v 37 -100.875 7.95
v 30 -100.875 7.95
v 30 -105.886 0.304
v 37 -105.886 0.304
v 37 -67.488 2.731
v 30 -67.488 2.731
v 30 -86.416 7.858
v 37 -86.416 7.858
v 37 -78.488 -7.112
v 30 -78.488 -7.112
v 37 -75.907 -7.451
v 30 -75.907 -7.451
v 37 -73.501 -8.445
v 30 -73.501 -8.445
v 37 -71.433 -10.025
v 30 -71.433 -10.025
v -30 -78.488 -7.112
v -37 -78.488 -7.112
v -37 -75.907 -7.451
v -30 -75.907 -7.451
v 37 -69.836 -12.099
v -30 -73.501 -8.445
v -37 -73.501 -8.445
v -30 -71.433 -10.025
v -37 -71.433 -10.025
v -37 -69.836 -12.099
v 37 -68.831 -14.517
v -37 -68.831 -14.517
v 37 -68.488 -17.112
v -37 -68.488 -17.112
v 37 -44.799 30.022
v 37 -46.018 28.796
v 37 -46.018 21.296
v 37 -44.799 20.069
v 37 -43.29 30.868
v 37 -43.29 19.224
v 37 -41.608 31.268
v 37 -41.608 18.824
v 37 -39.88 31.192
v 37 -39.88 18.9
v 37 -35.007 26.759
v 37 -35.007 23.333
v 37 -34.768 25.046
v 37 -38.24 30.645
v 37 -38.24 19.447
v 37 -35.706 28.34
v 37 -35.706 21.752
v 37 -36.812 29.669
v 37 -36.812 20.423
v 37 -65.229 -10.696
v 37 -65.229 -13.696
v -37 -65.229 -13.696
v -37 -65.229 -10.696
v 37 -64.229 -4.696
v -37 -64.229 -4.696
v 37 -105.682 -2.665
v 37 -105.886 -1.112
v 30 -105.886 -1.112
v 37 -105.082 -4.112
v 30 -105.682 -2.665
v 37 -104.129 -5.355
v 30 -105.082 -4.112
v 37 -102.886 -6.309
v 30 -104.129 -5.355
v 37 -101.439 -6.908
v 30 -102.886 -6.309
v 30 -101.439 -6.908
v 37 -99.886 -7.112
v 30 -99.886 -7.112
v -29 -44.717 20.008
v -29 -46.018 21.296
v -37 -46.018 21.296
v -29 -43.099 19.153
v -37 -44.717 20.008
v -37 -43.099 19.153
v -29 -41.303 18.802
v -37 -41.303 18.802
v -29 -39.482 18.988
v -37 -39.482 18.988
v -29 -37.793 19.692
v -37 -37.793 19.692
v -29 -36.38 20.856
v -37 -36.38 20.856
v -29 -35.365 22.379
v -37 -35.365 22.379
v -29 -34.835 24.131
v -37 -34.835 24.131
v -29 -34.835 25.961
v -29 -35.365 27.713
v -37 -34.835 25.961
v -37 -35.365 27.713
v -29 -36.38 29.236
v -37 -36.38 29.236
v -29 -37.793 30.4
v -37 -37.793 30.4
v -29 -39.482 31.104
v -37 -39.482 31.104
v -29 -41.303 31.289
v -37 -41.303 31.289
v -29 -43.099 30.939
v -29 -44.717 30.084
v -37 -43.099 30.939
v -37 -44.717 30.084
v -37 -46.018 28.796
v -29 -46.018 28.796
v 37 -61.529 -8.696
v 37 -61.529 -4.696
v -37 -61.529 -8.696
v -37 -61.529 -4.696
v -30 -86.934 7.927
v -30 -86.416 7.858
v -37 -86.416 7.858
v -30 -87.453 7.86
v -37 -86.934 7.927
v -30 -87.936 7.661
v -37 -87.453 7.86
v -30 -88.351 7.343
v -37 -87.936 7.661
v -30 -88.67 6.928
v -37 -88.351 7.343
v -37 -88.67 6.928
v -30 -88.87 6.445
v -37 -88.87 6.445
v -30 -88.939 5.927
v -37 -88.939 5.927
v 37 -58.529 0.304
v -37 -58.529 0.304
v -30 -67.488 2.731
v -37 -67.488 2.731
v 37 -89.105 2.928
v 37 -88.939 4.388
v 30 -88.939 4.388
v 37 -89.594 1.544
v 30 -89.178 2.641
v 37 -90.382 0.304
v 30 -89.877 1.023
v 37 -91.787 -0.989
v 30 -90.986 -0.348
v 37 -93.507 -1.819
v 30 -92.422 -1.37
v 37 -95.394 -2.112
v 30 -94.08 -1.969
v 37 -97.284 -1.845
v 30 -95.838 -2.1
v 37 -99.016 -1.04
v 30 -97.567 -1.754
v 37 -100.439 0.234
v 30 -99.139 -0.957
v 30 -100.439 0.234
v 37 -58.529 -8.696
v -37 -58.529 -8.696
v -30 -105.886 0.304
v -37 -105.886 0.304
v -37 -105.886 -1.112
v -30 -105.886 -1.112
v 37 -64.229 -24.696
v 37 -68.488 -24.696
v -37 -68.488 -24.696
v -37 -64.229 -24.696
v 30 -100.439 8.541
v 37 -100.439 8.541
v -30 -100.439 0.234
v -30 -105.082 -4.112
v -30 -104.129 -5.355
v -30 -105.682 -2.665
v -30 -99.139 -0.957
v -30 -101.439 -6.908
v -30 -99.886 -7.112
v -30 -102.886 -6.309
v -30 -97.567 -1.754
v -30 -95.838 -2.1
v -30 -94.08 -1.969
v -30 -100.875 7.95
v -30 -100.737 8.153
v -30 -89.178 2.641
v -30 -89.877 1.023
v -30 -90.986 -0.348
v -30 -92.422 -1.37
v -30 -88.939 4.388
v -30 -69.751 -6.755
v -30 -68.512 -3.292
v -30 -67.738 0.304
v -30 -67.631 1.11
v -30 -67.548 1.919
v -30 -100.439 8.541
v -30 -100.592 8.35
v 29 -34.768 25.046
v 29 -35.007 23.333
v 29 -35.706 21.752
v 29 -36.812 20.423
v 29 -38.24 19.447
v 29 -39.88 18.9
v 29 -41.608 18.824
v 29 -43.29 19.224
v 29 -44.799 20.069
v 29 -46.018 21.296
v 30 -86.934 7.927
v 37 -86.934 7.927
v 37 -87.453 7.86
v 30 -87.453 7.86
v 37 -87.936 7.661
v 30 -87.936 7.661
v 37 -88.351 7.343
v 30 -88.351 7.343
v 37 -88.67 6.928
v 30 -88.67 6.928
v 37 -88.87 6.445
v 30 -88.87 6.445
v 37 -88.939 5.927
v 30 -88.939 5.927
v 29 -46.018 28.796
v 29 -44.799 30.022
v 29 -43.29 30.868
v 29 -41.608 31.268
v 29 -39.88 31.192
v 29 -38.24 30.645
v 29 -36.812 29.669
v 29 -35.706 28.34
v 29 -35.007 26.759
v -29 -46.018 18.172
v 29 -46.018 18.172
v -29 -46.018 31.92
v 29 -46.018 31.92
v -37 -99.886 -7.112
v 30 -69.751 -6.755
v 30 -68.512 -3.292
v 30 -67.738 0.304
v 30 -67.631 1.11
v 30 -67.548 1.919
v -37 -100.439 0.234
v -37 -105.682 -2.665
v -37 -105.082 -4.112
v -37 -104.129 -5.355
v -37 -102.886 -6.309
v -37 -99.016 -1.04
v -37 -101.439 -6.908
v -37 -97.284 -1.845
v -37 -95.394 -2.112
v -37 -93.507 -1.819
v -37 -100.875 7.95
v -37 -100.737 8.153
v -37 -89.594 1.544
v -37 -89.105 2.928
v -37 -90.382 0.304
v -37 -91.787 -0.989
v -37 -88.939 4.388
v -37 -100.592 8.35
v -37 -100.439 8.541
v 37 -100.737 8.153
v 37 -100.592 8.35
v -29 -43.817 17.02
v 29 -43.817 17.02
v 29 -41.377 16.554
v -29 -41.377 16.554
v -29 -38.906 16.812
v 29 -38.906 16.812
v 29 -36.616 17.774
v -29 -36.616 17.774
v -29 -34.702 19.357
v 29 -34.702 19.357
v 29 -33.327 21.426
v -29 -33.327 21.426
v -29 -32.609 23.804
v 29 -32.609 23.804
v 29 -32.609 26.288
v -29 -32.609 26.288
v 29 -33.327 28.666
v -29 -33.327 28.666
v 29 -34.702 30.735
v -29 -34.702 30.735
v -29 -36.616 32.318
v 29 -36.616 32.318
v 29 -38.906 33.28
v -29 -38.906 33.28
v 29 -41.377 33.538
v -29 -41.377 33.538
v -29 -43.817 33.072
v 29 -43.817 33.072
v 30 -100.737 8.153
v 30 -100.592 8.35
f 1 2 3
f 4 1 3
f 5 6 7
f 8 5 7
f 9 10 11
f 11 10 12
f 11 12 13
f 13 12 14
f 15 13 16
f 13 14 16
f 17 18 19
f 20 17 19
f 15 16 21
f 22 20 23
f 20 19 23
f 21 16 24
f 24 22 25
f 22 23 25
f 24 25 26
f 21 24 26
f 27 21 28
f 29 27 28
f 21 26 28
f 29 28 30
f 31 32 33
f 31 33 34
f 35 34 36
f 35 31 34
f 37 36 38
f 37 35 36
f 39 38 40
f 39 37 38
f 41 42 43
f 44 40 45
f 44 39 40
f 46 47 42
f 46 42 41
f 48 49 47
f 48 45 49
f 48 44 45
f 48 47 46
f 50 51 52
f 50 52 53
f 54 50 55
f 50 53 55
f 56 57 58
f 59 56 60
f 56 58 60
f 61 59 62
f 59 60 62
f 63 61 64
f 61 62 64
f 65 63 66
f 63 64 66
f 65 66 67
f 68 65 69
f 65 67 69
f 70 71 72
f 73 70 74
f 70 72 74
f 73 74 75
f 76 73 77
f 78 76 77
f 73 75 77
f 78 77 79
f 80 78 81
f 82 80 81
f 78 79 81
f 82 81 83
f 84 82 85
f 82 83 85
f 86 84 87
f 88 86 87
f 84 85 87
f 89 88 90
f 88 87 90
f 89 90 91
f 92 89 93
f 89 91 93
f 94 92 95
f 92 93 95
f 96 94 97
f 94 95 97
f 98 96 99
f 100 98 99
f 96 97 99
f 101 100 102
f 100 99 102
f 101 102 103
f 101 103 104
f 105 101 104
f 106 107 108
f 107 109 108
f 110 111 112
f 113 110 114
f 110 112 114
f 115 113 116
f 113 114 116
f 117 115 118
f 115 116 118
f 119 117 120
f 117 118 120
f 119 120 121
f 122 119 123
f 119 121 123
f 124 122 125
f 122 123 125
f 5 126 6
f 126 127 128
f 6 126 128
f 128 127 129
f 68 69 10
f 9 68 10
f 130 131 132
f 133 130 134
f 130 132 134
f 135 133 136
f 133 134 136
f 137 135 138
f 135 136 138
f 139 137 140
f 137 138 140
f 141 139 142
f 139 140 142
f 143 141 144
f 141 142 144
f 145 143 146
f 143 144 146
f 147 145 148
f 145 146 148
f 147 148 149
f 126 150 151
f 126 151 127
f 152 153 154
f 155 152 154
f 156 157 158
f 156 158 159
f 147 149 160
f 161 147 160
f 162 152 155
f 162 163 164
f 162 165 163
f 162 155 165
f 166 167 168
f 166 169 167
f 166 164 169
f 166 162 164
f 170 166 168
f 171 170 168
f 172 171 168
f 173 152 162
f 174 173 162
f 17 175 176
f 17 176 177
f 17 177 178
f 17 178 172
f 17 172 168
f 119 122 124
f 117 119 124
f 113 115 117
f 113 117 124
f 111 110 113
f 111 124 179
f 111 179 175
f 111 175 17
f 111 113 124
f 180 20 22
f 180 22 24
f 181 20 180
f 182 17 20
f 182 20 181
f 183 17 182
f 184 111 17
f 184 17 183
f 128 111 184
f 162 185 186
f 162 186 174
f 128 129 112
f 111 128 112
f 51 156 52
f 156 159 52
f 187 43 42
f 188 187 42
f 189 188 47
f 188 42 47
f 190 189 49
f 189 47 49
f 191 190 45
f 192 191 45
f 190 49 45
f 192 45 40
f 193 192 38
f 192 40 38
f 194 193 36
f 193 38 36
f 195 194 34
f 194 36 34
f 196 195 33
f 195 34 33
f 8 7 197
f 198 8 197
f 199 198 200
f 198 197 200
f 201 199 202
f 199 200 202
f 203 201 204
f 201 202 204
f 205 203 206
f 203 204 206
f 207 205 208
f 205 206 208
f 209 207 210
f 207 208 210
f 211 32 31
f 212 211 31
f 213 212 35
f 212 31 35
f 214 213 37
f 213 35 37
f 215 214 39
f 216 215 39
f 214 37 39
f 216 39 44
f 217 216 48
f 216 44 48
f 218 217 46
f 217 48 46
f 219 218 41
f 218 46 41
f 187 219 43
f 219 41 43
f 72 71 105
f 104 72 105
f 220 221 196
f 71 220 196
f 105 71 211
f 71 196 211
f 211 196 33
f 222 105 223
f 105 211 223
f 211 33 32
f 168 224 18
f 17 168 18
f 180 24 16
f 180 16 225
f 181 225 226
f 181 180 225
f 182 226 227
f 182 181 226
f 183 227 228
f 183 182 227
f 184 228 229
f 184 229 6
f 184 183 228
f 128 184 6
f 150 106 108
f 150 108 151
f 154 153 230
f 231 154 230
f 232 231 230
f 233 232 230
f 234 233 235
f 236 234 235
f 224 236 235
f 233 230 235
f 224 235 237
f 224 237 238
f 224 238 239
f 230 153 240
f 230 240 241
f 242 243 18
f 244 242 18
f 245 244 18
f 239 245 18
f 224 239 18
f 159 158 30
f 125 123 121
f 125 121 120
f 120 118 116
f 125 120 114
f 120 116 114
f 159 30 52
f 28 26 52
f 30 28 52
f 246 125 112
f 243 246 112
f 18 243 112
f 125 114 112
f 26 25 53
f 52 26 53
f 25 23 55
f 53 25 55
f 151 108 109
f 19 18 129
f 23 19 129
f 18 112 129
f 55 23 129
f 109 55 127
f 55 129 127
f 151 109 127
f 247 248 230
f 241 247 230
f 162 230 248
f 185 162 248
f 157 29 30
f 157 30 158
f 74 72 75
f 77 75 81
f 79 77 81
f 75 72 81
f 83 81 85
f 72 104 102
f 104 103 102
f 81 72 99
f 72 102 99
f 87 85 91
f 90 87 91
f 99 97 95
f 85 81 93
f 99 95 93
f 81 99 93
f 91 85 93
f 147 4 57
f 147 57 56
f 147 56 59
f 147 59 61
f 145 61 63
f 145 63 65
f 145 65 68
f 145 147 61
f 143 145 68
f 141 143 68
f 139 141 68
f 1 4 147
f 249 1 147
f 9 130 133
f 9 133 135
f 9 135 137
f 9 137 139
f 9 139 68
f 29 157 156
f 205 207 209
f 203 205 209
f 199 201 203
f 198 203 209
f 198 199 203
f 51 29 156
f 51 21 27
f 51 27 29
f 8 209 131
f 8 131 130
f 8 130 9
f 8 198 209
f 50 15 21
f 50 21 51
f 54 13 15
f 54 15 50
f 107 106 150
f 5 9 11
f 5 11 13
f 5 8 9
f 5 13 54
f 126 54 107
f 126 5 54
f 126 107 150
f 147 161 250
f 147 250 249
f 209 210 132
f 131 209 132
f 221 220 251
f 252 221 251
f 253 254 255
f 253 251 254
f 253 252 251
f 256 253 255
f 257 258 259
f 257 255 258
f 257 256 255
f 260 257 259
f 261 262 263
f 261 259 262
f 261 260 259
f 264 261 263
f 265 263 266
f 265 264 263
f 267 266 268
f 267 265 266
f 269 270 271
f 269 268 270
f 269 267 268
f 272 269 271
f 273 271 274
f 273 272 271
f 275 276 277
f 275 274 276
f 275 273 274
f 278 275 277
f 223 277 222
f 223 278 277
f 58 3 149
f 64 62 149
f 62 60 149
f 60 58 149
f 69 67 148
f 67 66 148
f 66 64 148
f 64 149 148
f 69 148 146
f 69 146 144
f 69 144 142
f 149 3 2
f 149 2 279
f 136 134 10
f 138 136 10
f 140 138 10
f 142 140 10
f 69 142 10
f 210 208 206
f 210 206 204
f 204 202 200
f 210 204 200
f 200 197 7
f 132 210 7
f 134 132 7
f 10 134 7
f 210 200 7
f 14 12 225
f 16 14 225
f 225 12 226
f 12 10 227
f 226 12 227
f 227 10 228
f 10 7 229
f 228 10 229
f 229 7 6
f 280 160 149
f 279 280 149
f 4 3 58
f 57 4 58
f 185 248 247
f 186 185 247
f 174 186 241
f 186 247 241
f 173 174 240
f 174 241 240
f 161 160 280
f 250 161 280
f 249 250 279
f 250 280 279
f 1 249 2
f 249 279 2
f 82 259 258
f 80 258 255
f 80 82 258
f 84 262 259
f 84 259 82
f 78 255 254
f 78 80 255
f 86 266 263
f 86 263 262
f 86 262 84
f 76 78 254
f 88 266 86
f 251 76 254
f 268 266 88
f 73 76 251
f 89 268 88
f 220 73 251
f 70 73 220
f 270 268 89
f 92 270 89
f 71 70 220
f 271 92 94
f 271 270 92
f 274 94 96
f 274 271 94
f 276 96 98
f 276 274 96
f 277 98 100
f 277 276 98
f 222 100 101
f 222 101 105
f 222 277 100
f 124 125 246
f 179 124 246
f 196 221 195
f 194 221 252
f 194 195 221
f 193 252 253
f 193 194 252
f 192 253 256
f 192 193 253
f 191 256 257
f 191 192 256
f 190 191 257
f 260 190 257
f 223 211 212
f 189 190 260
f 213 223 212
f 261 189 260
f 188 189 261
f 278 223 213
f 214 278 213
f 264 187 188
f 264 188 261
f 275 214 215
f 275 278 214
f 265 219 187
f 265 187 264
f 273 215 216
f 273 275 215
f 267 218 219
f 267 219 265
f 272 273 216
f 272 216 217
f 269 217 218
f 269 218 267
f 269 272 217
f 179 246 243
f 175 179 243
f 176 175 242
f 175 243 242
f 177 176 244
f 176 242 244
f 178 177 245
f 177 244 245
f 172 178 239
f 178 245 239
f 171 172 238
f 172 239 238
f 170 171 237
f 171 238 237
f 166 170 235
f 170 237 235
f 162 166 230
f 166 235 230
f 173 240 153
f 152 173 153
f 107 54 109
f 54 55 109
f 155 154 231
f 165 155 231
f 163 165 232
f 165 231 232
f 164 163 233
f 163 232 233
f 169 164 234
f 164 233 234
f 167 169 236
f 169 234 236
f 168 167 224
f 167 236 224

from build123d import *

# Parameters (mm, degrees)
F1_DEPTH      = 37
F1_DEPTH_BACK = 37
F2_DEPTH      = 30
F2_DEPTH_BACK = 30
F3_R          = 8.5
F4_DEPTH      = 37
F4_DEPTH_BACK = 37
F6_DEPTH      = 74.001
F8_DEPTH      = 8
F10_DEPTH     = 8


with BuildPart() as f1:
    # F0 (on Right) → F1 (new body, two sides)
    with BuildSketch(Plane.YZ) as f1_sk:
        with BuildLine():
            ThreePointArc((-78.4882180956, -7.1124182744), (-74.6718335634, -7.8693014244), (-71.4331604605, -10.0253764539))
            ThreePointArc((-71.4331604605, -10.0253764539), (-69.0747981117, -5.0434256298), (-67.7380949338, 0.3039972631))
            Line((-67.7380949338, 0.3039972631), (-67.8932940144, 0.3039972631))
            Line((-67.8932940144, 0.3039972631), (-88.9387147452, 0.3039972631))
            Line((-88.9387147452, 0.3039972631), (-90.38160708, 0.3039972631))
            ThreePointArc((-90.38160708, 0.3039972631), (-95.393650332, -2.112262057), (-100.4387147452, 0.2342697942))
            ThreePointArc((-100.4387147452, 0.2342697942), (-100.4673894342, 0.2690345458), (-100.4958224104, 0.3039972631))
            Line((-100.4958224104, 0.3039972631), (-105.886151975, 0.3039972631))
            Line((-105.886151975, 0.3039972631), (-105.886151975, -1.1124182744))
            ThreePointArc((-105.886151975, -1.1124182744), (-104.1287926621, -5.3550589615), (-99.886151975, -7.1124182744))
            Line((-99.886151975, -7.1124182744), (-78.4882180956, -7.1124182744))
        make_face()
        with BuildLine():
            Line((-100.4387147452, 0.2342697942), (-100.4387147452, 0.3039972631))
            Line((-100.4387147452, 0.3039972631), (-100.4958224104, 0.3039972631))
            ThreePointArc((-100.4958224104, 0.3039972631), (-100.4673894342, 0.2690345458), (-100.4387147452, 0.2342697942))
        make_face()
        with BuildLine():
            Line((-100.4958224104, 0.3039972631), (-100.4387147452, 0.3039972631))
            Line((-100.4387147452, 0.3039972631), (-100.4387147452, 8.5408936571))
            ThreePointArc((-100.4387147452, 8.5408936571), (-100.6653734684, 8.2517813311), (-100.8753365595, 7.9503255065))
            ThreePointArc((-100.8753365595, 7.9503255065), (-101.9307231786, 4.0653605264), (-100.4958224104, 0.3039972631))
        make_face()
        with BuildLine():
            Line((-100.8753365595, 7.9503255065), (-105.886151975, 0.3039972631))
            Line((-105.886151975, 0.3039972631), (-100.4958224104, 0.3039972631))
            ThreePointArc((-100.4958224104, 0.3039972631), (-101.9307231786, 4.0653605264), (-100.8753365595, 7.9503255065))
        make_face()
        with BuildLine():
            Line((-67.8932940144, 0.3039972631), (-67.7380949338, 0.3039972631))
            ThreePointArc((-67.7380949338, 0.3039972631), (-67.5865005705, 1.5145753621), (-67.4877856318, 2.7306080696))
            Line((-67.4877856318, 2.7306080696), (-86.4158285453, 7.8575344772))
            ThreePointArc((-86.4158285453, 7.8575344772), (-88.1540804515, 7.5154562914), (-88.9387147452, 5.9270966974))
            Line((-88.9387147452, 5.9270966974), (-88.9387147452, 4.3875817256))
            Line((-88.9387147452, 4.3875817256), (-88.9387147452, 0.3039972631))
            Line((-88.9387147452, 0.3039972631), (-67.8932940144, 0.3039972631))
        make_face()
        with BuildLine():
            Line((-68.4882180956, -24.6960027369), (-64.2290080275, -24.6960027369))
            Line((-64.2290080275, -24.6960027369), (-65.2290080275, -13.6960027369))
            Line((-65.2290080275, -13.6960027369), (-65.2290080275, -10.6960027369))
            Line((-65.2290080275, -10.6960027369), (-64.2290080275, -4.6960027369))
            Line((-64.2290080275, -4.6960027369), (-61.5290080275, -4.6960027369))
            Line((-61.5290080275, -4.6960027369), (-61.5290080275, -8.6960027369))
            Line((-61.5290080275, -8.6960027369), (-58.5290080275, -8.6960027369))
            Line((-58.5290080275, -8.6960027369), (-58.5290080275, 0.3039972631))
            Line((-58.5290080275, 0.3039972631), (-67.7380949338, 0.3039972631))
            ThreePointArc((-67.7380949338, 0.3039972631), (-69.0747981117, -5.0434256298), (-71.4331604605, -10.0253764539))
            ThreePointArc((-71.4331604605, -10.0253764539), (-69.2537561094, -13.2751390528), (-68.4882180956, -17.1124182744))
            Line((-68.4882180956, -17.1124182744), (-68.4882180956, -24.6960027369))
        make_face()
        with BuildLine():
            ThreePointArc((-67.4877856318, 2.7306080696), (-67.5865005705, 1.5145753621), (-67.7380949338, 0.3039972631))
            Line((-67.7380949338, 0.3039972631), (-58.5290080275, 0.3039972631))
            Line((-58.5290080275, 0.3039972631), (-67.4877856318, 2.7306080696))
        make_face()
        with BuildLine():
            Line((-90.38160708, 0.3039972631), (-88.9387147452, 0.3039972631))
            Line((-88.9387147452, 0.3039972631), (-88.9387147452, 4.3875817256))
            ThreePointArc((-88.9387147452, 4.3875817256), (-89.3100444235, 2.2220794541), (-90.38160708, 0.3039972631))
        make_face()
    extrude(amount=-F1_DEPTH)
    extrude(f1_sk.sketch, amount=F1_DEPTH_BACK)

    # F0 (on Right) → F2 (cut, two sides)
    with BuildSketch(Plane.YZ) as f2_sk:
        with BuildLine():
            ThreePointArc((-67.4387147452, 4.3875817256), (-122.4216308216, 11.8656991367), (-71.4331604605, -10.0253764539))
            ThreePointArc((-71.4331604605, -10.0253764539), (-74.6718335634, -7.8693014244), (-78.4882180956, -7.1124182744))
            Line((-78.4882180956, -7.1124182744), (-99.886151975, -7.1124182744))
            ThreePointArc((-99.886151975, -7.1124182744), (-104.1287926621, -5.3550589615), (-105.886151975, -1.1124182744))
            Line((-105.886151975, -1.1124182744), (-105.886151975, 0.3039972631))
            Line((-105.886151975, 0.3039972631), (-100.8753365595, 7.9503255065))
            ThreePointArc((-100.8753365595, 7.9503255065), (-100.6653734684, 8.2517813311), (-100.4387147452, 8.5408936571))
            ThreePointArc((-100.4387147452, 8.5408936571), (-93.2307745286, 10.5010913559), (-88.9387147452, 4.3875817256))
            Line((-88.9387147452, 4.3875817256), (-88.9387147452, 5.9270966974))
            ThreePointArc((-88.9387147452, 5.9270966974), (-88.1540804515, 7.5154562914), (-86.4158285453, 7.8575344772))
            Line((-86.4158285453, 7.8575344772), (-67.4877856318, 2.7306080696))
            ThreePointArc((-67.4877856318, 2.7306080696), (-67.4509851555, 3.5587316715), (-67.4387147452, 4.3875817256))
        make_face()
        with BuildLine():
            Line((-100.4387147452, 0.3039972631), (-90.38160708, 0.3039972631))
            ThreePointArc((-90.38160708, 0.3039972631), (-89.3100444235, 2.2220794541), (-88.9387147452, 4.3875817256))
            ThreePointArc((-88.9387147452, 4.3875817256), (-93.2307745286, 10.5010913559), (-100.4387147452, 8.5408936571))
            Line((-100.4387147452, 8.5408936571), (-100.4387147452, 0.3039972631))
        make_face()
        with BuildLine():
            ThreePointArc((-100.4387147452, 0.2342697942), (-95.393650332, -2.112262057), (-90.38160708, 0.3039972631))
            Line((-90.38160708, 0.3039972631), (-100.4387147452, 0.3039972631))
            Line((-100.4387147452, 0.3039972631), (-100.4387147452, 0.2342697942))
        make_face()
        with BuildLine():
            Line((-100.4958224104, 0.3039972631), (-100.4387147452, 0.3039972631))
            Line((-100.4387147452, 0.3039972631), (-100.4387147452, 8.5408936571))
            ThreePointArc((-100.4387147452, 8.5408936571), (-100.6653734684, 8.2517813311), (-100.8753365595, 7.9503255065))
            ThreePointArc((-100.8753365595, 7.9503255065), (-101.9307231786, 4.0653605264), (-100.4958224104, 0.3039972631))
        make_face()
        with BuildLine():
            Line((-100.4387147452, 0.2342697942), (-100.4387147452, 0.3039972631))
            Line((-100.4387147452, 0.3039972631), (-100.4958224104, 0.3039972631))
            ThreePointArc((-100.4958224104, 0.3039972631), (-100.4673894342, 0.2690345458), (-100.4387147452, 0.2342697942))
        make_face()
        with BuildLine():
            ThreePointArc((-78.4882180956, -7.1124182744), (-74.6718335634, -7.8693014244), (-71.4331604605, -10.0253764539))
            ThreePointArc((-71.4331604605, -10.0253764539), (-69.0747981117, -5.0434256298), (-67.7380949338, 0.3039972631))
            Line((-67.7380949338, 0.3039972631), (-67.8932940144, 0.3039972631))
            Line((-67.8932940144, 0.3039972631), (-88.9387147452, 0.3039972631))
            Line((-88.9387147452, 0.3039972631), (-90.38160708, 0.3039972631))
            ThreePointArc((-90.38160708, 0.3039972631), (-95.393650332, -2.112262057), (-100.4387147452, 0.2342697942))
            ThreePointArc((-100.4387147452, 0.2342697942), (-100.4673894342, 0.2690345458), (-100.4958224104, 0.3039972631))
            Line((-100.4958224104, 0.3039972631), (-105.886151975, 0.3039972631))
            Line((-105.886151975, 0.3039972631), (-105.886151975, -1.1124182744))
            ThreePointArc((-105.886151975, -1.1124182744), (-104.1287926621, -5.3550589615), (-99.886151975, -7.1124182744))
            Line((-99.886151975, -7.1124182744), (-78.4882180956, -7.1124182744))
        make_face()
        with BuildLine():
            Line((-67.8932940144, 0.3039972631), (-67.7380949338, 0.3039972631))
            ThreePointArc((-67.7380949338, 0.3039972631), (-67.5865005705, 1.5145753621), (-67.4877856318, 2.7306080696))
            Line((-67.4877856318, 2.7306080696), (-86.4158285453, 7.8575344772))
            ThreePointArc((-86.4158285453, 7.8575344772), (-88.1540804515, 7.5154562914), (-88.9387147452, 5.9270966974))
            Line((-88.9387147452, 5.9270966974), (-88.9387147452, 4.3875817256))
            Line((-88.9387147452, 4.3875817256), (-88.9387147452, 0.3039972631))
            Line((-88.9387147452, 0.3039972631), (-67.8932940144, 0.3039972631))
        make_face()
        with BuildLine():
            Line((-100.8753365595, 7.9503255065), (-105.886151975, 0.3039972631))
            Line((-105.886151975, 0.3039972631), (-100.4958224104, 0.3039972631))
            ThreePointArc((-100.4958224104, 0.3039972631), (-101.9307231786, 4.0653605264), (-100.8753365595, 7.9503255065))
        make_face()
        with BuildLine():
            Line((-90.38160708, 0.3039972631), (-88.9387147452, 0.3039972631))
            Line((-88.9387147452, 0.3039972631), (-88.9387147452, 4.3875817256))
            ThreePointArc((-88.9387147452, 4.3875817256), (-89.3100444235, 2.2220794541), (-90.38160708, 0.3039972631))
        make_face()
    extrude(amount=-F2_DEPTH, mode=Mode.SUBTRACT)
    extrude(f2_sk.sketch, amount=F2_DEPTH_BACK, mode=Mode.SUBTRACT)


with BuildPart() as f4:
    # F3 (on Right) → F4 (new body, two sides)
    with BuildSketch(Plane.YZ) as f4_sk:
        with Locations((-41.0175137222, 25.0459443778)):
            Circle(F3_R)
    extrude(amount=F4_DEPTH)
    extrude(f4_sk.sketch, amount=-F4_DEPTH_BACK)

    # F5 (on face) → F6 (cut, through all)
    with BuildSketch(Plane.YZ.offset(37)):
        with BuildLine():
            Line((-46.0175137222, 18.1720808353), (-46.0175137222, 31.9198079202))
            ThreePointArc((-46.0175137222, 31.9198079202), (-49.5175137222, 25.0459443778), (-46.0175137222, 18.1720808353))
        make_face()
    extrude(amount=-F6_DEPTH, mode=Mode.SUBTRACT)

    # F7 (on face) → F8 (cut)
    with BuildSketch(Plane.YZ.offset(37)):
        with BuildLine():
            ThreePointArc((-46.0175137222, 28.7959443778), (-39.0410901846, 30.9752149906), (-34.7675137222, 25.0459443778))
            ThreePointArc((-34.7675137222, 25.0459443778), (-39.0410901846, 19.116673765), (-46.0175137222, 21.2959443778))
            Line((-46.0175137222, 21.2959443778), (-46.0175137222, 18.1720808353))
            ThreePointArc((-46.0175137222, 18.1720808353), (-32.5175137222, 25.0459443778), (-46.0175137222, 31.9198079202))
            Line((-46.0175137222, 31.9198079202), (-46.0175137222, 28.7959443778))
        make_face()
    extrude(amount=-F8_DEPTH, mode=Mode.SUBTRACT)

    # F9 (on face) → F10 (cut)
    with BuildSketch(Plane(origin=(-37, 0, 0), x_dir=(0, -1, 0), z_dir=(-1, 0, 0))):
        with BuildLine():
            ThreePointArc((46.0175137222, 21.2959443778), (34.7675137222, 25.0459443778), (46.0175137222, 28.7959443778))
            Line((46.0175137222, 28.7959443778), (46.0175137222, 31.9198079202))
            ThreePointArc((46.0175137222, 31.9198079202), (32.5175137222, 25.0459443778), (46.0175137222, 18.1720808353))
            Line((46.0175137222, 18.1720808353), (46.0175137222, 21.2959443778))
        make_face()
    extrude(amount=-F10_DEPTH, mode=Mode.SUBTRACT)


solid = Compound([f1.part, f4.part])
